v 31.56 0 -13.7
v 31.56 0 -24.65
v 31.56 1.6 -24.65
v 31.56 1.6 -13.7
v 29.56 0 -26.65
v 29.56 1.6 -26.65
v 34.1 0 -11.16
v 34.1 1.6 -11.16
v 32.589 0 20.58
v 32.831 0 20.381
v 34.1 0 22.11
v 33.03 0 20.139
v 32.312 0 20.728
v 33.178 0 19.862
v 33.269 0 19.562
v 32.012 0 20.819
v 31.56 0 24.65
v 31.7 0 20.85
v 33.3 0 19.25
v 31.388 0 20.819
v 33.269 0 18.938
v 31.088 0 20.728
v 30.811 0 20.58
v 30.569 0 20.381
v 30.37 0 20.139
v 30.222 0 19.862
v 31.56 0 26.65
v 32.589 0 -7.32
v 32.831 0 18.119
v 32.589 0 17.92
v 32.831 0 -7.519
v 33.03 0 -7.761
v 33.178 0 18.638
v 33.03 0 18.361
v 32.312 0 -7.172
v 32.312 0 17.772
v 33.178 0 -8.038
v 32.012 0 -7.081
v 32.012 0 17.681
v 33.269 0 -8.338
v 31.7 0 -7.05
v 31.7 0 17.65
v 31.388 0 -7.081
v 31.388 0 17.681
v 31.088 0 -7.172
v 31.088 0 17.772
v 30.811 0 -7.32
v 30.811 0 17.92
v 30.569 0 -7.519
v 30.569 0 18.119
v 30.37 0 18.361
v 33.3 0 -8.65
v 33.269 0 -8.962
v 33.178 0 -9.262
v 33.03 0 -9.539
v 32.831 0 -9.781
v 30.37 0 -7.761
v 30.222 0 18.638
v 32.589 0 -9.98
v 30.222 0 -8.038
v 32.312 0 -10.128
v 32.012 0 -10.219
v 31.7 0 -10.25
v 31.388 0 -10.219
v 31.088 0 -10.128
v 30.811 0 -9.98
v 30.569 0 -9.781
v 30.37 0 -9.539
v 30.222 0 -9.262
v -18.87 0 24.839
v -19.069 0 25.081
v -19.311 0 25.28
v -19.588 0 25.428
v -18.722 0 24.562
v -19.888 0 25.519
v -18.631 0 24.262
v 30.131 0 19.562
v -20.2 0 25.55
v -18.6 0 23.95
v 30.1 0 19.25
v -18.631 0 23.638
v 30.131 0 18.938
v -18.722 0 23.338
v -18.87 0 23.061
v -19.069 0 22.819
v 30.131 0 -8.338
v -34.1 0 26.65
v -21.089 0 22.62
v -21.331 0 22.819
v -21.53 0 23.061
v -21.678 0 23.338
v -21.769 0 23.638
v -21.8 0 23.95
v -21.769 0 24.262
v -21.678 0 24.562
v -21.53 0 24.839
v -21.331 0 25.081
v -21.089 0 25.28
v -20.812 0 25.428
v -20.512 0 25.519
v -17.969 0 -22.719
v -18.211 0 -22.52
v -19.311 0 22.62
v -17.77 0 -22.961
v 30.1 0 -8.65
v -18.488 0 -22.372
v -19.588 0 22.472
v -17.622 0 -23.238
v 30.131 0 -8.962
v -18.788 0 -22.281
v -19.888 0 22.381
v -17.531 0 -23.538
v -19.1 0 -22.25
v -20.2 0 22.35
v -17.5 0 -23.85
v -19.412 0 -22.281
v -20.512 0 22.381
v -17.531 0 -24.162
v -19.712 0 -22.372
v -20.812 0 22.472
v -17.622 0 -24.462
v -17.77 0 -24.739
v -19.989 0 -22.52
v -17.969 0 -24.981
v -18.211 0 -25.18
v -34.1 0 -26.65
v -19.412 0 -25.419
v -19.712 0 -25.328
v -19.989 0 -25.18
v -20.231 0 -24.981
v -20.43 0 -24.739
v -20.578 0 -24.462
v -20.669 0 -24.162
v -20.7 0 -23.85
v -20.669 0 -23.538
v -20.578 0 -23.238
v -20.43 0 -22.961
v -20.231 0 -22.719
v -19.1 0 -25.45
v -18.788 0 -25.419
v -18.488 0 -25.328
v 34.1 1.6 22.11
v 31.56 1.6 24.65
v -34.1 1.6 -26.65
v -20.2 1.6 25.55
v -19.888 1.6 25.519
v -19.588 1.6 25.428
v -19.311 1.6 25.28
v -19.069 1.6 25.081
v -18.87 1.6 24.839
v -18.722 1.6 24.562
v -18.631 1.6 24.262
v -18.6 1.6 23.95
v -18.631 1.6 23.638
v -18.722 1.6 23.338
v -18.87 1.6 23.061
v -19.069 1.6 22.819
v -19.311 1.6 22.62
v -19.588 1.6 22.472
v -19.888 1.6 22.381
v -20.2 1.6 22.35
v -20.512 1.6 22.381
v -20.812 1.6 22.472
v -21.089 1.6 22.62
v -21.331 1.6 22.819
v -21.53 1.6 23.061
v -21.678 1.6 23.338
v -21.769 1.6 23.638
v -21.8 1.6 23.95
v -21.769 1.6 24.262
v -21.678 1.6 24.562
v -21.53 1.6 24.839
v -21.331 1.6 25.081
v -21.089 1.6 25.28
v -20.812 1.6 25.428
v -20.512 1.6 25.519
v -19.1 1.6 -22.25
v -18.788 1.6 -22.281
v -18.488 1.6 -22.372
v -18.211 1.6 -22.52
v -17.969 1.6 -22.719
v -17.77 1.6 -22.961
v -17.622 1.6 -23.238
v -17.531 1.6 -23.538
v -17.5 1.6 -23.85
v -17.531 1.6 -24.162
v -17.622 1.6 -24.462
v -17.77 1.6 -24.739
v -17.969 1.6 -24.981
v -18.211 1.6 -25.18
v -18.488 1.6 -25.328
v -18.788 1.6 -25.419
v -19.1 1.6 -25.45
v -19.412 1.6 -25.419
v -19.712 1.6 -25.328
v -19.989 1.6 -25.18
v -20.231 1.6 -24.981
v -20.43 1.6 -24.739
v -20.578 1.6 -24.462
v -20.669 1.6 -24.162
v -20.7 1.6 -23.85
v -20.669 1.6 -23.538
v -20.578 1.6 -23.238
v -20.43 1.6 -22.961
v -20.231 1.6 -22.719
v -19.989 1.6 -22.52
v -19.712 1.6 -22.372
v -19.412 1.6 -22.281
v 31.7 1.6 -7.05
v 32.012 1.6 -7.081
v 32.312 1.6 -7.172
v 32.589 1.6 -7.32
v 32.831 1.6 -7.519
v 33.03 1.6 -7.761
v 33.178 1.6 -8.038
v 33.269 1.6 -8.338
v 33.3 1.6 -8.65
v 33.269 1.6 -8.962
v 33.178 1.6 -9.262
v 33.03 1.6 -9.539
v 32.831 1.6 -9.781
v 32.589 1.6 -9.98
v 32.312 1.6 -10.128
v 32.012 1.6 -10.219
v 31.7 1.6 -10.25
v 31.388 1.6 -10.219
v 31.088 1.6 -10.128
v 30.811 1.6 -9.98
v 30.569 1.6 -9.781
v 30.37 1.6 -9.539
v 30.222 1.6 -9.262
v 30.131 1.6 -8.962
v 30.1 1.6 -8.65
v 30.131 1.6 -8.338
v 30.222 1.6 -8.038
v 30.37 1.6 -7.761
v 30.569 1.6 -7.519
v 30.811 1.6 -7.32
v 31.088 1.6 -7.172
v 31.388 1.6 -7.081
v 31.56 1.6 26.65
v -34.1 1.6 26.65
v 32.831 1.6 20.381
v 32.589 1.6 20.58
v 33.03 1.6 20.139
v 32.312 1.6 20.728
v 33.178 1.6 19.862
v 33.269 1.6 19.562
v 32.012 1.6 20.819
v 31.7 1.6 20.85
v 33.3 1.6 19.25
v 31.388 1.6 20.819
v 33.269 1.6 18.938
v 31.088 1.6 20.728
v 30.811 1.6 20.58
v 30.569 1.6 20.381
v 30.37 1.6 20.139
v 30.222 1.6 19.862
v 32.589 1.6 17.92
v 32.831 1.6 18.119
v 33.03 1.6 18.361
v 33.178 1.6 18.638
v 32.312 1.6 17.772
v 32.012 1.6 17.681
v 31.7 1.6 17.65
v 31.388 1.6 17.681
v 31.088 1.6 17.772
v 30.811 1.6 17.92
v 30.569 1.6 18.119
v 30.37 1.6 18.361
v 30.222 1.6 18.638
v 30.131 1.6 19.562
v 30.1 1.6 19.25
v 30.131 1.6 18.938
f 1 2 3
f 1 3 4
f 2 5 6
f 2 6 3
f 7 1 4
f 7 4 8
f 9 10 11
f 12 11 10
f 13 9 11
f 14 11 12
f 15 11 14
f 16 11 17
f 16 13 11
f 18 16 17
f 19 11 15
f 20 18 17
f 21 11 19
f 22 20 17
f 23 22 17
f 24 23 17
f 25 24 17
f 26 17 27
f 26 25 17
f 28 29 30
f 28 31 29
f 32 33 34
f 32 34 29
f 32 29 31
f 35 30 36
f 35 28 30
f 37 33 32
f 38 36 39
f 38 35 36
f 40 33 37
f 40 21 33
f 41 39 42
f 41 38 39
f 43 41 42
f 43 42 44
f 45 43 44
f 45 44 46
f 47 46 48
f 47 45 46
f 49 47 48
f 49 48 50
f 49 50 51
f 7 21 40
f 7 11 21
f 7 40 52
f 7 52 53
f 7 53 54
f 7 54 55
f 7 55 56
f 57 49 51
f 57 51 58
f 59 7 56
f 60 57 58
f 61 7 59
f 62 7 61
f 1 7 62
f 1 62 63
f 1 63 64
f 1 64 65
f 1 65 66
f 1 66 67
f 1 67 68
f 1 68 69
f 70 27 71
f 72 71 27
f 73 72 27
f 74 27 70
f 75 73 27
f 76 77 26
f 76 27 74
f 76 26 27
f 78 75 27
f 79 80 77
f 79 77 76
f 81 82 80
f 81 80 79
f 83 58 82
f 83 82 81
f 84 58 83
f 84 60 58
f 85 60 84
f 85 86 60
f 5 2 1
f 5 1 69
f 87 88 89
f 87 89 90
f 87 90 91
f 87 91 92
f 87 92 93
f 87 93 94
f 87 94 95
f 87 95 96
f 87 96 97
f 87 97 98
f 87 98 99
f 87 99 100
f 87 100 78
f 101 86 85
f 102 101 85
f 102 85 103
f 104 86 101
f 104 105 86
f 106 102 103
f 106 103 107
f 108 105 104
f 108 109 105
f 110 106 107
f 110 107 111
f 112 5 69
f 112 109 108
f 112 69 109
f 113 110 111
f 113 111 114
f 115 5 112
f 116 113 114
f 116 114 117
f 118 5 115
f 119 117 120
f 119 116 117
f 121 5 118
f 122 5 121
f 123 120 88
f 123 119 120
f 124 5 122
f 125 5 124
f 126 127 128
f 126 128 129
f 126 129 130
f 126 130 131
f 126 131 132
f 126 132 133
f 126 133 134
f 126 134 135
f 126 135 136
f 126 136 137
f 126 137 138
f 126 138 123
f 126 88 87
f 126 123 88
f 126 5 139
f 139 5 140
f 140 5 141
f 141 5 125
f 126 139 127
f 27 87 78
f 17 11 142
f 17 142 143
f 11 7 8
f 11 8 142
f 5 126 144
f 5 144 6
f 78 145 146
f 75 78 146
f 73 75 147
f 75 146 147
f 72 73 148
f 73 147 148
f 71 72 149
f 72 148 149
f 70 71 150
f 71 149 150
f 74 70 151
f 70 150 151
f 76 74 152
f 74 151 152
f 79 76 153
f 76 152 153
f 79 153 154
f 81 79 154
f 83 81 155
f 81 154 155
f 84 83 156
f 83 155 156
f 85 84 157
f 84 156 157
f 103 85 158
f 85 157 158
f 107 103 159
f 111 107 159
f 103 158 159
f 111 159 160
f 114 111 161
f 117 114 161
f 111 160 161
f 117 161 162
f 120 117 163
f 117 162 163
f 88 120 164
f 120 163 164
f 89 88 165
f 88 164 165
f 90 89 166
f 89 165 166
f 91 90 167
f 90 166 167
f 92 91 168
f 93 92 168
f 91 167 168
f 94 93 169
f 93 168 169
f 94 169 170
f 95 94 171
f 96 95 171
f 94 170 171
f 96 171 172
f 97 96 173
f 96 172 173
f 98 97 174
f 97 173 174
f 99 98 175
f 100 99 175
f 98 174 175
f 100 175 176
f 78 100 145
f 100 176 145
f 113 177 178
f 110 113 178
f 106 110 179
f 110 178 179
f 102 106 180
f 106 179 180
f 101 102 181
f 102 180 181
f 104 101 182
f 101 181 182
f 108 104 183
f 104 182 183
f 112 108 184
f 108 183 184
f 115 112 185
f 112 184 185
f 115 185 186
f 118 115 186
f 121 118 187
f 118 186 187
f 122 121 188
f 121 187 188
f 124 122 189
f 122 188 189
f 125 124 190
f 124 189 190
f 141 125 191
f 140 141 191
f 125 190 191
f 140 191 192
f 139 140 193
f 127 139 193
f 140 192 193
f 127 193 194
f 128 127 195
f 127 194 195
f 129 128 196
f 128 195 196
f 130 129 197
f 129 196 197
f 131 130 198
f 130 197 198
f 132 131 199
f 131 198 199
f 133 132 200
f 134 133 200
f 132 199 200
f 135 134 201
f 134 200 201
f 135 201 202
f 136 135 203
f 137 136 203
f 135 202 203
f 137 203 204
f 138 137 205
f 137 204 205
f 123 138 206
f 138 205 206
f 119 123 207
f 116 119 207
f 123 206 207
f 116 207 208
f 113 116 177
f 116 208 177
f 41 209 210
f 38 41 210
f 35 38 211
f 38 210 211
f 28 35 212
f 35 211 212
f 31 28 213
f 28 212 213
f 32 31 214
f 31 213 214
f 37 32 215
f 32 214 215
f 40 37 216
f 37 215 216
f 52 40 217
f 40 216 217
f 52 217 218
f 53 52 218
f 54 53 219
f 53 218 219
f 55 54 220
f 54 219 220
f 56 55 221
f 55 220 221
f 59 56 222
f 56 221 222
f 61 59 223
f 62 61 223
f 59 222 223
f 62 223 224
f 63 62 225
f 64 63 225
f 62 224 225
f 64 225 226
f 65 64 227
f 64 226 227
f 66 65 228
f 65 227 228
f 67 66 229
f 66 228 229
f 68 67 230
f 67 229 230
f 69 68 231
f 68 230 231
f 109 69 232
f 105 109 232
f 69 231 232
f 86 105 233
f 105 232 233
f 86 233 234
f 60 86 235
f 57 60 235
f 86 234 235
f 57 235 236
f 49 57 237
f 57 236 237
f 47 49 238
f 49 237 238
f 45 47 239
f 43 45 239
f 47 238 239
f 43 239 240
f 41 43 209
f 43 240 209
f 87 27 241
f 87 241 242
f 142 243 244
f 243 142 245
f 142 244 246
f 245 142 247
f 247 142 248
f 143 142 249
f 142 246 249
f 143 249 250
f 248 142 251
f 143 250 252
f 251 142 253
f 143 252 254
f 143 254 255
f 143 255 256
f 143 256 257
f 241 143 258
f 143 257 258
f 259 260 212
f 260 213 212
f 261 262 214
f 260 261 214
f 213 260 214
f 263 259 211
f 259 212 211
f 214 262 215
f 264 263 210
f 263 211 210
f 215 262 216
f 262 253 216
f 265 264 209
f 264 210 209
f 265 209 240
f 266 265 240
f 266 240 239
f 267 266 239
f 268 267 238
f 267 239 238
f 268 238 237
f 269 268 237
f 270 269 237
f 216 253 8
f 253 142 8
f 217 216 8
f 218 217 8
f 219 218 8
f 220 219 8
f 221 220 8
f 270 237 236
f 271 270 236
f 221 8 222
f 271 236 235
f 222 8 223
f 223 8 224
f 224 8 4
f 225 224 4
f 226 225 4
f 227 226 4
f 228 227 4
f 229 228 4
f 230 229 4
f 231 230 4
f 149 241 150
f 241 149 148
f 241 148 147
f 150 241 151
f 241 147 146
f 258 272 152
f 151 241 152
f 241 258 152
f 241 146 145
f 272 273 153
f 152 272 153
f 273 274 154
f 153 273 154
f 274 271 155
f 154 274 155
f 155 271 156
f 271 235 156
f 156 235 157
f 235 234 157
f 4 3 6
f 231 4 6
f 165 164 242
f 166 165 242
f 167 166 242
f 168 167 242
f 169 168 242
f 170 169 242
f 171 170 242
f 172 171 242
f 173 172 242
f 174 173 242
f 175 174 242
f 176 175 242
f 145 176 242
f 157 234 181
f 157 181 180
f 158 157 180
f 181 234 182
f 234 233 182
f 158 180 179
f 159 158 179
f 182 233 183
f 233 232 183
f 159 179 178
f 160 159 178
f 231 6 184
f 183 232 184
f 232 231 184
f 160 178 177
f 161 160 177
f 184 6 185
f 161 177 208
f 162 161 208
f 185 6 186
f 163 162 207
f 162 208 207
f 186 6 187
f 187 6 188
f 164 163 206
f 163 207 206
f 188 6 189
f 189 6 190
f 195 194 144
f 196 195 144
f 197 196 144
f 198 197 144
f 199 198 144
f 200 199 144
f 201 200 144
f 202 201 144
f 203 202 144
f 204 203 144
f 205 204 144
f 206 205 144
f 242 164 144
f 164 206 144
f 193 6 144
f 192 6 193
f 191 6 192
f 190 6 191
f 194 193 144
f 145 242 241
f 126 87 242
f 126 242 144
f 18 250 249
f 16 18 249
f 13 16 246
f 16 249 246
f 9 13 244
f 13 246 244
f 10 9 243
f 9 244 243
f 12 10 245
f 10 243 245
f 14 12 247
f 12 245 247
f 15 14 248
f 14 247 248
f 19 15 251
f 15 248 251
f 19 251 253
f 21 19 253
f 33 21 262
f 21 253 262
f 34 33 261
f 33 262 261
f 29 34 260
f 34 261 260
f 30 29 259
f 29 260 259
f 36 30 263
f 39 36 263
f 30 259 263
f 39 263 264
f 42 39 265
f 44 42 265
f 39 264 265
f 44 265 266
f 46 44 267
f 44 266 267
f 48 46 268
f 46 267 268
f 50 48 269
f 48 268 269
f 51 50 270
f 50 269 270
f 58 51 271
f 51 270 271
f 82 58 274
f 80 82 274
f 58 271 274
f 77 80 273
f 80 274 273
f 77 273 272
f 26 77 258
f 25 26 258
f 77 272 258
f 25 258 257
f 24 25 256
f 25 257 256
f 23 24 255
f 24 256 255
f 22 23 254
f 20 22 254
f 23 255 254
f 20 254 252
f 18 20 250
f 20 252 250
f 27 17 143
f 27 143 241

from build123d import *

# Parameters (mm, degrees)
BOSS_EXTRUDE1_DEPTH = 1.6
SKETCH4_R           = 1.6
CUT_EXTRUDE1_DEPTH  = 1.6


with BuildPart() as part:
    # Sketch3 → Boss-Extrude1 (new body)
    with BuildSketch(Plane(origin=(0, 0, 0), x_dir=(1, 0, 0), z_dir=(0, 1, 0))):
        Polygon((-34.1, 26.65), (29.56, 26.65), (31.56, 24.65), (31.56, 13.7), (34.1, 11.16), (34.1, -22.11), (31.56, -24.65), (31.56, -26.65), (-34.1, -26.65), align=None)
    extrude(amount=BOSS_EXTRUDE1_DEPTH)

    # Sketch4 → Cut-Extrude1 (cut)
    with BuildSketch(Plane(origin=(0, 1.6, 0), x_dir=(1, 0, 0), z_dir=(0, 1, 0))):
        with Locations(Location((-19.1, 23.85, 0), (0, 0, 270))):
            Circle(SKETCH4_R)
        with Locations(Location((31.7, 8.65, 0), (0, 0, 270))):
            Circle(SKETCH4_R)
        with Locations(Location((31.7, -19.25, 0), (0, 0, 270))):
            Circle(SKETCH4_R)
        with Locations(Location((-20.2, -23.95, 0), (0, 0, 270))):
            Circle(SKETCH4_R)
    extrude(amount=-CUT_EXTRUDE1_DEPTH, mode=Mode.SUBTRACT)


solid = part.part
